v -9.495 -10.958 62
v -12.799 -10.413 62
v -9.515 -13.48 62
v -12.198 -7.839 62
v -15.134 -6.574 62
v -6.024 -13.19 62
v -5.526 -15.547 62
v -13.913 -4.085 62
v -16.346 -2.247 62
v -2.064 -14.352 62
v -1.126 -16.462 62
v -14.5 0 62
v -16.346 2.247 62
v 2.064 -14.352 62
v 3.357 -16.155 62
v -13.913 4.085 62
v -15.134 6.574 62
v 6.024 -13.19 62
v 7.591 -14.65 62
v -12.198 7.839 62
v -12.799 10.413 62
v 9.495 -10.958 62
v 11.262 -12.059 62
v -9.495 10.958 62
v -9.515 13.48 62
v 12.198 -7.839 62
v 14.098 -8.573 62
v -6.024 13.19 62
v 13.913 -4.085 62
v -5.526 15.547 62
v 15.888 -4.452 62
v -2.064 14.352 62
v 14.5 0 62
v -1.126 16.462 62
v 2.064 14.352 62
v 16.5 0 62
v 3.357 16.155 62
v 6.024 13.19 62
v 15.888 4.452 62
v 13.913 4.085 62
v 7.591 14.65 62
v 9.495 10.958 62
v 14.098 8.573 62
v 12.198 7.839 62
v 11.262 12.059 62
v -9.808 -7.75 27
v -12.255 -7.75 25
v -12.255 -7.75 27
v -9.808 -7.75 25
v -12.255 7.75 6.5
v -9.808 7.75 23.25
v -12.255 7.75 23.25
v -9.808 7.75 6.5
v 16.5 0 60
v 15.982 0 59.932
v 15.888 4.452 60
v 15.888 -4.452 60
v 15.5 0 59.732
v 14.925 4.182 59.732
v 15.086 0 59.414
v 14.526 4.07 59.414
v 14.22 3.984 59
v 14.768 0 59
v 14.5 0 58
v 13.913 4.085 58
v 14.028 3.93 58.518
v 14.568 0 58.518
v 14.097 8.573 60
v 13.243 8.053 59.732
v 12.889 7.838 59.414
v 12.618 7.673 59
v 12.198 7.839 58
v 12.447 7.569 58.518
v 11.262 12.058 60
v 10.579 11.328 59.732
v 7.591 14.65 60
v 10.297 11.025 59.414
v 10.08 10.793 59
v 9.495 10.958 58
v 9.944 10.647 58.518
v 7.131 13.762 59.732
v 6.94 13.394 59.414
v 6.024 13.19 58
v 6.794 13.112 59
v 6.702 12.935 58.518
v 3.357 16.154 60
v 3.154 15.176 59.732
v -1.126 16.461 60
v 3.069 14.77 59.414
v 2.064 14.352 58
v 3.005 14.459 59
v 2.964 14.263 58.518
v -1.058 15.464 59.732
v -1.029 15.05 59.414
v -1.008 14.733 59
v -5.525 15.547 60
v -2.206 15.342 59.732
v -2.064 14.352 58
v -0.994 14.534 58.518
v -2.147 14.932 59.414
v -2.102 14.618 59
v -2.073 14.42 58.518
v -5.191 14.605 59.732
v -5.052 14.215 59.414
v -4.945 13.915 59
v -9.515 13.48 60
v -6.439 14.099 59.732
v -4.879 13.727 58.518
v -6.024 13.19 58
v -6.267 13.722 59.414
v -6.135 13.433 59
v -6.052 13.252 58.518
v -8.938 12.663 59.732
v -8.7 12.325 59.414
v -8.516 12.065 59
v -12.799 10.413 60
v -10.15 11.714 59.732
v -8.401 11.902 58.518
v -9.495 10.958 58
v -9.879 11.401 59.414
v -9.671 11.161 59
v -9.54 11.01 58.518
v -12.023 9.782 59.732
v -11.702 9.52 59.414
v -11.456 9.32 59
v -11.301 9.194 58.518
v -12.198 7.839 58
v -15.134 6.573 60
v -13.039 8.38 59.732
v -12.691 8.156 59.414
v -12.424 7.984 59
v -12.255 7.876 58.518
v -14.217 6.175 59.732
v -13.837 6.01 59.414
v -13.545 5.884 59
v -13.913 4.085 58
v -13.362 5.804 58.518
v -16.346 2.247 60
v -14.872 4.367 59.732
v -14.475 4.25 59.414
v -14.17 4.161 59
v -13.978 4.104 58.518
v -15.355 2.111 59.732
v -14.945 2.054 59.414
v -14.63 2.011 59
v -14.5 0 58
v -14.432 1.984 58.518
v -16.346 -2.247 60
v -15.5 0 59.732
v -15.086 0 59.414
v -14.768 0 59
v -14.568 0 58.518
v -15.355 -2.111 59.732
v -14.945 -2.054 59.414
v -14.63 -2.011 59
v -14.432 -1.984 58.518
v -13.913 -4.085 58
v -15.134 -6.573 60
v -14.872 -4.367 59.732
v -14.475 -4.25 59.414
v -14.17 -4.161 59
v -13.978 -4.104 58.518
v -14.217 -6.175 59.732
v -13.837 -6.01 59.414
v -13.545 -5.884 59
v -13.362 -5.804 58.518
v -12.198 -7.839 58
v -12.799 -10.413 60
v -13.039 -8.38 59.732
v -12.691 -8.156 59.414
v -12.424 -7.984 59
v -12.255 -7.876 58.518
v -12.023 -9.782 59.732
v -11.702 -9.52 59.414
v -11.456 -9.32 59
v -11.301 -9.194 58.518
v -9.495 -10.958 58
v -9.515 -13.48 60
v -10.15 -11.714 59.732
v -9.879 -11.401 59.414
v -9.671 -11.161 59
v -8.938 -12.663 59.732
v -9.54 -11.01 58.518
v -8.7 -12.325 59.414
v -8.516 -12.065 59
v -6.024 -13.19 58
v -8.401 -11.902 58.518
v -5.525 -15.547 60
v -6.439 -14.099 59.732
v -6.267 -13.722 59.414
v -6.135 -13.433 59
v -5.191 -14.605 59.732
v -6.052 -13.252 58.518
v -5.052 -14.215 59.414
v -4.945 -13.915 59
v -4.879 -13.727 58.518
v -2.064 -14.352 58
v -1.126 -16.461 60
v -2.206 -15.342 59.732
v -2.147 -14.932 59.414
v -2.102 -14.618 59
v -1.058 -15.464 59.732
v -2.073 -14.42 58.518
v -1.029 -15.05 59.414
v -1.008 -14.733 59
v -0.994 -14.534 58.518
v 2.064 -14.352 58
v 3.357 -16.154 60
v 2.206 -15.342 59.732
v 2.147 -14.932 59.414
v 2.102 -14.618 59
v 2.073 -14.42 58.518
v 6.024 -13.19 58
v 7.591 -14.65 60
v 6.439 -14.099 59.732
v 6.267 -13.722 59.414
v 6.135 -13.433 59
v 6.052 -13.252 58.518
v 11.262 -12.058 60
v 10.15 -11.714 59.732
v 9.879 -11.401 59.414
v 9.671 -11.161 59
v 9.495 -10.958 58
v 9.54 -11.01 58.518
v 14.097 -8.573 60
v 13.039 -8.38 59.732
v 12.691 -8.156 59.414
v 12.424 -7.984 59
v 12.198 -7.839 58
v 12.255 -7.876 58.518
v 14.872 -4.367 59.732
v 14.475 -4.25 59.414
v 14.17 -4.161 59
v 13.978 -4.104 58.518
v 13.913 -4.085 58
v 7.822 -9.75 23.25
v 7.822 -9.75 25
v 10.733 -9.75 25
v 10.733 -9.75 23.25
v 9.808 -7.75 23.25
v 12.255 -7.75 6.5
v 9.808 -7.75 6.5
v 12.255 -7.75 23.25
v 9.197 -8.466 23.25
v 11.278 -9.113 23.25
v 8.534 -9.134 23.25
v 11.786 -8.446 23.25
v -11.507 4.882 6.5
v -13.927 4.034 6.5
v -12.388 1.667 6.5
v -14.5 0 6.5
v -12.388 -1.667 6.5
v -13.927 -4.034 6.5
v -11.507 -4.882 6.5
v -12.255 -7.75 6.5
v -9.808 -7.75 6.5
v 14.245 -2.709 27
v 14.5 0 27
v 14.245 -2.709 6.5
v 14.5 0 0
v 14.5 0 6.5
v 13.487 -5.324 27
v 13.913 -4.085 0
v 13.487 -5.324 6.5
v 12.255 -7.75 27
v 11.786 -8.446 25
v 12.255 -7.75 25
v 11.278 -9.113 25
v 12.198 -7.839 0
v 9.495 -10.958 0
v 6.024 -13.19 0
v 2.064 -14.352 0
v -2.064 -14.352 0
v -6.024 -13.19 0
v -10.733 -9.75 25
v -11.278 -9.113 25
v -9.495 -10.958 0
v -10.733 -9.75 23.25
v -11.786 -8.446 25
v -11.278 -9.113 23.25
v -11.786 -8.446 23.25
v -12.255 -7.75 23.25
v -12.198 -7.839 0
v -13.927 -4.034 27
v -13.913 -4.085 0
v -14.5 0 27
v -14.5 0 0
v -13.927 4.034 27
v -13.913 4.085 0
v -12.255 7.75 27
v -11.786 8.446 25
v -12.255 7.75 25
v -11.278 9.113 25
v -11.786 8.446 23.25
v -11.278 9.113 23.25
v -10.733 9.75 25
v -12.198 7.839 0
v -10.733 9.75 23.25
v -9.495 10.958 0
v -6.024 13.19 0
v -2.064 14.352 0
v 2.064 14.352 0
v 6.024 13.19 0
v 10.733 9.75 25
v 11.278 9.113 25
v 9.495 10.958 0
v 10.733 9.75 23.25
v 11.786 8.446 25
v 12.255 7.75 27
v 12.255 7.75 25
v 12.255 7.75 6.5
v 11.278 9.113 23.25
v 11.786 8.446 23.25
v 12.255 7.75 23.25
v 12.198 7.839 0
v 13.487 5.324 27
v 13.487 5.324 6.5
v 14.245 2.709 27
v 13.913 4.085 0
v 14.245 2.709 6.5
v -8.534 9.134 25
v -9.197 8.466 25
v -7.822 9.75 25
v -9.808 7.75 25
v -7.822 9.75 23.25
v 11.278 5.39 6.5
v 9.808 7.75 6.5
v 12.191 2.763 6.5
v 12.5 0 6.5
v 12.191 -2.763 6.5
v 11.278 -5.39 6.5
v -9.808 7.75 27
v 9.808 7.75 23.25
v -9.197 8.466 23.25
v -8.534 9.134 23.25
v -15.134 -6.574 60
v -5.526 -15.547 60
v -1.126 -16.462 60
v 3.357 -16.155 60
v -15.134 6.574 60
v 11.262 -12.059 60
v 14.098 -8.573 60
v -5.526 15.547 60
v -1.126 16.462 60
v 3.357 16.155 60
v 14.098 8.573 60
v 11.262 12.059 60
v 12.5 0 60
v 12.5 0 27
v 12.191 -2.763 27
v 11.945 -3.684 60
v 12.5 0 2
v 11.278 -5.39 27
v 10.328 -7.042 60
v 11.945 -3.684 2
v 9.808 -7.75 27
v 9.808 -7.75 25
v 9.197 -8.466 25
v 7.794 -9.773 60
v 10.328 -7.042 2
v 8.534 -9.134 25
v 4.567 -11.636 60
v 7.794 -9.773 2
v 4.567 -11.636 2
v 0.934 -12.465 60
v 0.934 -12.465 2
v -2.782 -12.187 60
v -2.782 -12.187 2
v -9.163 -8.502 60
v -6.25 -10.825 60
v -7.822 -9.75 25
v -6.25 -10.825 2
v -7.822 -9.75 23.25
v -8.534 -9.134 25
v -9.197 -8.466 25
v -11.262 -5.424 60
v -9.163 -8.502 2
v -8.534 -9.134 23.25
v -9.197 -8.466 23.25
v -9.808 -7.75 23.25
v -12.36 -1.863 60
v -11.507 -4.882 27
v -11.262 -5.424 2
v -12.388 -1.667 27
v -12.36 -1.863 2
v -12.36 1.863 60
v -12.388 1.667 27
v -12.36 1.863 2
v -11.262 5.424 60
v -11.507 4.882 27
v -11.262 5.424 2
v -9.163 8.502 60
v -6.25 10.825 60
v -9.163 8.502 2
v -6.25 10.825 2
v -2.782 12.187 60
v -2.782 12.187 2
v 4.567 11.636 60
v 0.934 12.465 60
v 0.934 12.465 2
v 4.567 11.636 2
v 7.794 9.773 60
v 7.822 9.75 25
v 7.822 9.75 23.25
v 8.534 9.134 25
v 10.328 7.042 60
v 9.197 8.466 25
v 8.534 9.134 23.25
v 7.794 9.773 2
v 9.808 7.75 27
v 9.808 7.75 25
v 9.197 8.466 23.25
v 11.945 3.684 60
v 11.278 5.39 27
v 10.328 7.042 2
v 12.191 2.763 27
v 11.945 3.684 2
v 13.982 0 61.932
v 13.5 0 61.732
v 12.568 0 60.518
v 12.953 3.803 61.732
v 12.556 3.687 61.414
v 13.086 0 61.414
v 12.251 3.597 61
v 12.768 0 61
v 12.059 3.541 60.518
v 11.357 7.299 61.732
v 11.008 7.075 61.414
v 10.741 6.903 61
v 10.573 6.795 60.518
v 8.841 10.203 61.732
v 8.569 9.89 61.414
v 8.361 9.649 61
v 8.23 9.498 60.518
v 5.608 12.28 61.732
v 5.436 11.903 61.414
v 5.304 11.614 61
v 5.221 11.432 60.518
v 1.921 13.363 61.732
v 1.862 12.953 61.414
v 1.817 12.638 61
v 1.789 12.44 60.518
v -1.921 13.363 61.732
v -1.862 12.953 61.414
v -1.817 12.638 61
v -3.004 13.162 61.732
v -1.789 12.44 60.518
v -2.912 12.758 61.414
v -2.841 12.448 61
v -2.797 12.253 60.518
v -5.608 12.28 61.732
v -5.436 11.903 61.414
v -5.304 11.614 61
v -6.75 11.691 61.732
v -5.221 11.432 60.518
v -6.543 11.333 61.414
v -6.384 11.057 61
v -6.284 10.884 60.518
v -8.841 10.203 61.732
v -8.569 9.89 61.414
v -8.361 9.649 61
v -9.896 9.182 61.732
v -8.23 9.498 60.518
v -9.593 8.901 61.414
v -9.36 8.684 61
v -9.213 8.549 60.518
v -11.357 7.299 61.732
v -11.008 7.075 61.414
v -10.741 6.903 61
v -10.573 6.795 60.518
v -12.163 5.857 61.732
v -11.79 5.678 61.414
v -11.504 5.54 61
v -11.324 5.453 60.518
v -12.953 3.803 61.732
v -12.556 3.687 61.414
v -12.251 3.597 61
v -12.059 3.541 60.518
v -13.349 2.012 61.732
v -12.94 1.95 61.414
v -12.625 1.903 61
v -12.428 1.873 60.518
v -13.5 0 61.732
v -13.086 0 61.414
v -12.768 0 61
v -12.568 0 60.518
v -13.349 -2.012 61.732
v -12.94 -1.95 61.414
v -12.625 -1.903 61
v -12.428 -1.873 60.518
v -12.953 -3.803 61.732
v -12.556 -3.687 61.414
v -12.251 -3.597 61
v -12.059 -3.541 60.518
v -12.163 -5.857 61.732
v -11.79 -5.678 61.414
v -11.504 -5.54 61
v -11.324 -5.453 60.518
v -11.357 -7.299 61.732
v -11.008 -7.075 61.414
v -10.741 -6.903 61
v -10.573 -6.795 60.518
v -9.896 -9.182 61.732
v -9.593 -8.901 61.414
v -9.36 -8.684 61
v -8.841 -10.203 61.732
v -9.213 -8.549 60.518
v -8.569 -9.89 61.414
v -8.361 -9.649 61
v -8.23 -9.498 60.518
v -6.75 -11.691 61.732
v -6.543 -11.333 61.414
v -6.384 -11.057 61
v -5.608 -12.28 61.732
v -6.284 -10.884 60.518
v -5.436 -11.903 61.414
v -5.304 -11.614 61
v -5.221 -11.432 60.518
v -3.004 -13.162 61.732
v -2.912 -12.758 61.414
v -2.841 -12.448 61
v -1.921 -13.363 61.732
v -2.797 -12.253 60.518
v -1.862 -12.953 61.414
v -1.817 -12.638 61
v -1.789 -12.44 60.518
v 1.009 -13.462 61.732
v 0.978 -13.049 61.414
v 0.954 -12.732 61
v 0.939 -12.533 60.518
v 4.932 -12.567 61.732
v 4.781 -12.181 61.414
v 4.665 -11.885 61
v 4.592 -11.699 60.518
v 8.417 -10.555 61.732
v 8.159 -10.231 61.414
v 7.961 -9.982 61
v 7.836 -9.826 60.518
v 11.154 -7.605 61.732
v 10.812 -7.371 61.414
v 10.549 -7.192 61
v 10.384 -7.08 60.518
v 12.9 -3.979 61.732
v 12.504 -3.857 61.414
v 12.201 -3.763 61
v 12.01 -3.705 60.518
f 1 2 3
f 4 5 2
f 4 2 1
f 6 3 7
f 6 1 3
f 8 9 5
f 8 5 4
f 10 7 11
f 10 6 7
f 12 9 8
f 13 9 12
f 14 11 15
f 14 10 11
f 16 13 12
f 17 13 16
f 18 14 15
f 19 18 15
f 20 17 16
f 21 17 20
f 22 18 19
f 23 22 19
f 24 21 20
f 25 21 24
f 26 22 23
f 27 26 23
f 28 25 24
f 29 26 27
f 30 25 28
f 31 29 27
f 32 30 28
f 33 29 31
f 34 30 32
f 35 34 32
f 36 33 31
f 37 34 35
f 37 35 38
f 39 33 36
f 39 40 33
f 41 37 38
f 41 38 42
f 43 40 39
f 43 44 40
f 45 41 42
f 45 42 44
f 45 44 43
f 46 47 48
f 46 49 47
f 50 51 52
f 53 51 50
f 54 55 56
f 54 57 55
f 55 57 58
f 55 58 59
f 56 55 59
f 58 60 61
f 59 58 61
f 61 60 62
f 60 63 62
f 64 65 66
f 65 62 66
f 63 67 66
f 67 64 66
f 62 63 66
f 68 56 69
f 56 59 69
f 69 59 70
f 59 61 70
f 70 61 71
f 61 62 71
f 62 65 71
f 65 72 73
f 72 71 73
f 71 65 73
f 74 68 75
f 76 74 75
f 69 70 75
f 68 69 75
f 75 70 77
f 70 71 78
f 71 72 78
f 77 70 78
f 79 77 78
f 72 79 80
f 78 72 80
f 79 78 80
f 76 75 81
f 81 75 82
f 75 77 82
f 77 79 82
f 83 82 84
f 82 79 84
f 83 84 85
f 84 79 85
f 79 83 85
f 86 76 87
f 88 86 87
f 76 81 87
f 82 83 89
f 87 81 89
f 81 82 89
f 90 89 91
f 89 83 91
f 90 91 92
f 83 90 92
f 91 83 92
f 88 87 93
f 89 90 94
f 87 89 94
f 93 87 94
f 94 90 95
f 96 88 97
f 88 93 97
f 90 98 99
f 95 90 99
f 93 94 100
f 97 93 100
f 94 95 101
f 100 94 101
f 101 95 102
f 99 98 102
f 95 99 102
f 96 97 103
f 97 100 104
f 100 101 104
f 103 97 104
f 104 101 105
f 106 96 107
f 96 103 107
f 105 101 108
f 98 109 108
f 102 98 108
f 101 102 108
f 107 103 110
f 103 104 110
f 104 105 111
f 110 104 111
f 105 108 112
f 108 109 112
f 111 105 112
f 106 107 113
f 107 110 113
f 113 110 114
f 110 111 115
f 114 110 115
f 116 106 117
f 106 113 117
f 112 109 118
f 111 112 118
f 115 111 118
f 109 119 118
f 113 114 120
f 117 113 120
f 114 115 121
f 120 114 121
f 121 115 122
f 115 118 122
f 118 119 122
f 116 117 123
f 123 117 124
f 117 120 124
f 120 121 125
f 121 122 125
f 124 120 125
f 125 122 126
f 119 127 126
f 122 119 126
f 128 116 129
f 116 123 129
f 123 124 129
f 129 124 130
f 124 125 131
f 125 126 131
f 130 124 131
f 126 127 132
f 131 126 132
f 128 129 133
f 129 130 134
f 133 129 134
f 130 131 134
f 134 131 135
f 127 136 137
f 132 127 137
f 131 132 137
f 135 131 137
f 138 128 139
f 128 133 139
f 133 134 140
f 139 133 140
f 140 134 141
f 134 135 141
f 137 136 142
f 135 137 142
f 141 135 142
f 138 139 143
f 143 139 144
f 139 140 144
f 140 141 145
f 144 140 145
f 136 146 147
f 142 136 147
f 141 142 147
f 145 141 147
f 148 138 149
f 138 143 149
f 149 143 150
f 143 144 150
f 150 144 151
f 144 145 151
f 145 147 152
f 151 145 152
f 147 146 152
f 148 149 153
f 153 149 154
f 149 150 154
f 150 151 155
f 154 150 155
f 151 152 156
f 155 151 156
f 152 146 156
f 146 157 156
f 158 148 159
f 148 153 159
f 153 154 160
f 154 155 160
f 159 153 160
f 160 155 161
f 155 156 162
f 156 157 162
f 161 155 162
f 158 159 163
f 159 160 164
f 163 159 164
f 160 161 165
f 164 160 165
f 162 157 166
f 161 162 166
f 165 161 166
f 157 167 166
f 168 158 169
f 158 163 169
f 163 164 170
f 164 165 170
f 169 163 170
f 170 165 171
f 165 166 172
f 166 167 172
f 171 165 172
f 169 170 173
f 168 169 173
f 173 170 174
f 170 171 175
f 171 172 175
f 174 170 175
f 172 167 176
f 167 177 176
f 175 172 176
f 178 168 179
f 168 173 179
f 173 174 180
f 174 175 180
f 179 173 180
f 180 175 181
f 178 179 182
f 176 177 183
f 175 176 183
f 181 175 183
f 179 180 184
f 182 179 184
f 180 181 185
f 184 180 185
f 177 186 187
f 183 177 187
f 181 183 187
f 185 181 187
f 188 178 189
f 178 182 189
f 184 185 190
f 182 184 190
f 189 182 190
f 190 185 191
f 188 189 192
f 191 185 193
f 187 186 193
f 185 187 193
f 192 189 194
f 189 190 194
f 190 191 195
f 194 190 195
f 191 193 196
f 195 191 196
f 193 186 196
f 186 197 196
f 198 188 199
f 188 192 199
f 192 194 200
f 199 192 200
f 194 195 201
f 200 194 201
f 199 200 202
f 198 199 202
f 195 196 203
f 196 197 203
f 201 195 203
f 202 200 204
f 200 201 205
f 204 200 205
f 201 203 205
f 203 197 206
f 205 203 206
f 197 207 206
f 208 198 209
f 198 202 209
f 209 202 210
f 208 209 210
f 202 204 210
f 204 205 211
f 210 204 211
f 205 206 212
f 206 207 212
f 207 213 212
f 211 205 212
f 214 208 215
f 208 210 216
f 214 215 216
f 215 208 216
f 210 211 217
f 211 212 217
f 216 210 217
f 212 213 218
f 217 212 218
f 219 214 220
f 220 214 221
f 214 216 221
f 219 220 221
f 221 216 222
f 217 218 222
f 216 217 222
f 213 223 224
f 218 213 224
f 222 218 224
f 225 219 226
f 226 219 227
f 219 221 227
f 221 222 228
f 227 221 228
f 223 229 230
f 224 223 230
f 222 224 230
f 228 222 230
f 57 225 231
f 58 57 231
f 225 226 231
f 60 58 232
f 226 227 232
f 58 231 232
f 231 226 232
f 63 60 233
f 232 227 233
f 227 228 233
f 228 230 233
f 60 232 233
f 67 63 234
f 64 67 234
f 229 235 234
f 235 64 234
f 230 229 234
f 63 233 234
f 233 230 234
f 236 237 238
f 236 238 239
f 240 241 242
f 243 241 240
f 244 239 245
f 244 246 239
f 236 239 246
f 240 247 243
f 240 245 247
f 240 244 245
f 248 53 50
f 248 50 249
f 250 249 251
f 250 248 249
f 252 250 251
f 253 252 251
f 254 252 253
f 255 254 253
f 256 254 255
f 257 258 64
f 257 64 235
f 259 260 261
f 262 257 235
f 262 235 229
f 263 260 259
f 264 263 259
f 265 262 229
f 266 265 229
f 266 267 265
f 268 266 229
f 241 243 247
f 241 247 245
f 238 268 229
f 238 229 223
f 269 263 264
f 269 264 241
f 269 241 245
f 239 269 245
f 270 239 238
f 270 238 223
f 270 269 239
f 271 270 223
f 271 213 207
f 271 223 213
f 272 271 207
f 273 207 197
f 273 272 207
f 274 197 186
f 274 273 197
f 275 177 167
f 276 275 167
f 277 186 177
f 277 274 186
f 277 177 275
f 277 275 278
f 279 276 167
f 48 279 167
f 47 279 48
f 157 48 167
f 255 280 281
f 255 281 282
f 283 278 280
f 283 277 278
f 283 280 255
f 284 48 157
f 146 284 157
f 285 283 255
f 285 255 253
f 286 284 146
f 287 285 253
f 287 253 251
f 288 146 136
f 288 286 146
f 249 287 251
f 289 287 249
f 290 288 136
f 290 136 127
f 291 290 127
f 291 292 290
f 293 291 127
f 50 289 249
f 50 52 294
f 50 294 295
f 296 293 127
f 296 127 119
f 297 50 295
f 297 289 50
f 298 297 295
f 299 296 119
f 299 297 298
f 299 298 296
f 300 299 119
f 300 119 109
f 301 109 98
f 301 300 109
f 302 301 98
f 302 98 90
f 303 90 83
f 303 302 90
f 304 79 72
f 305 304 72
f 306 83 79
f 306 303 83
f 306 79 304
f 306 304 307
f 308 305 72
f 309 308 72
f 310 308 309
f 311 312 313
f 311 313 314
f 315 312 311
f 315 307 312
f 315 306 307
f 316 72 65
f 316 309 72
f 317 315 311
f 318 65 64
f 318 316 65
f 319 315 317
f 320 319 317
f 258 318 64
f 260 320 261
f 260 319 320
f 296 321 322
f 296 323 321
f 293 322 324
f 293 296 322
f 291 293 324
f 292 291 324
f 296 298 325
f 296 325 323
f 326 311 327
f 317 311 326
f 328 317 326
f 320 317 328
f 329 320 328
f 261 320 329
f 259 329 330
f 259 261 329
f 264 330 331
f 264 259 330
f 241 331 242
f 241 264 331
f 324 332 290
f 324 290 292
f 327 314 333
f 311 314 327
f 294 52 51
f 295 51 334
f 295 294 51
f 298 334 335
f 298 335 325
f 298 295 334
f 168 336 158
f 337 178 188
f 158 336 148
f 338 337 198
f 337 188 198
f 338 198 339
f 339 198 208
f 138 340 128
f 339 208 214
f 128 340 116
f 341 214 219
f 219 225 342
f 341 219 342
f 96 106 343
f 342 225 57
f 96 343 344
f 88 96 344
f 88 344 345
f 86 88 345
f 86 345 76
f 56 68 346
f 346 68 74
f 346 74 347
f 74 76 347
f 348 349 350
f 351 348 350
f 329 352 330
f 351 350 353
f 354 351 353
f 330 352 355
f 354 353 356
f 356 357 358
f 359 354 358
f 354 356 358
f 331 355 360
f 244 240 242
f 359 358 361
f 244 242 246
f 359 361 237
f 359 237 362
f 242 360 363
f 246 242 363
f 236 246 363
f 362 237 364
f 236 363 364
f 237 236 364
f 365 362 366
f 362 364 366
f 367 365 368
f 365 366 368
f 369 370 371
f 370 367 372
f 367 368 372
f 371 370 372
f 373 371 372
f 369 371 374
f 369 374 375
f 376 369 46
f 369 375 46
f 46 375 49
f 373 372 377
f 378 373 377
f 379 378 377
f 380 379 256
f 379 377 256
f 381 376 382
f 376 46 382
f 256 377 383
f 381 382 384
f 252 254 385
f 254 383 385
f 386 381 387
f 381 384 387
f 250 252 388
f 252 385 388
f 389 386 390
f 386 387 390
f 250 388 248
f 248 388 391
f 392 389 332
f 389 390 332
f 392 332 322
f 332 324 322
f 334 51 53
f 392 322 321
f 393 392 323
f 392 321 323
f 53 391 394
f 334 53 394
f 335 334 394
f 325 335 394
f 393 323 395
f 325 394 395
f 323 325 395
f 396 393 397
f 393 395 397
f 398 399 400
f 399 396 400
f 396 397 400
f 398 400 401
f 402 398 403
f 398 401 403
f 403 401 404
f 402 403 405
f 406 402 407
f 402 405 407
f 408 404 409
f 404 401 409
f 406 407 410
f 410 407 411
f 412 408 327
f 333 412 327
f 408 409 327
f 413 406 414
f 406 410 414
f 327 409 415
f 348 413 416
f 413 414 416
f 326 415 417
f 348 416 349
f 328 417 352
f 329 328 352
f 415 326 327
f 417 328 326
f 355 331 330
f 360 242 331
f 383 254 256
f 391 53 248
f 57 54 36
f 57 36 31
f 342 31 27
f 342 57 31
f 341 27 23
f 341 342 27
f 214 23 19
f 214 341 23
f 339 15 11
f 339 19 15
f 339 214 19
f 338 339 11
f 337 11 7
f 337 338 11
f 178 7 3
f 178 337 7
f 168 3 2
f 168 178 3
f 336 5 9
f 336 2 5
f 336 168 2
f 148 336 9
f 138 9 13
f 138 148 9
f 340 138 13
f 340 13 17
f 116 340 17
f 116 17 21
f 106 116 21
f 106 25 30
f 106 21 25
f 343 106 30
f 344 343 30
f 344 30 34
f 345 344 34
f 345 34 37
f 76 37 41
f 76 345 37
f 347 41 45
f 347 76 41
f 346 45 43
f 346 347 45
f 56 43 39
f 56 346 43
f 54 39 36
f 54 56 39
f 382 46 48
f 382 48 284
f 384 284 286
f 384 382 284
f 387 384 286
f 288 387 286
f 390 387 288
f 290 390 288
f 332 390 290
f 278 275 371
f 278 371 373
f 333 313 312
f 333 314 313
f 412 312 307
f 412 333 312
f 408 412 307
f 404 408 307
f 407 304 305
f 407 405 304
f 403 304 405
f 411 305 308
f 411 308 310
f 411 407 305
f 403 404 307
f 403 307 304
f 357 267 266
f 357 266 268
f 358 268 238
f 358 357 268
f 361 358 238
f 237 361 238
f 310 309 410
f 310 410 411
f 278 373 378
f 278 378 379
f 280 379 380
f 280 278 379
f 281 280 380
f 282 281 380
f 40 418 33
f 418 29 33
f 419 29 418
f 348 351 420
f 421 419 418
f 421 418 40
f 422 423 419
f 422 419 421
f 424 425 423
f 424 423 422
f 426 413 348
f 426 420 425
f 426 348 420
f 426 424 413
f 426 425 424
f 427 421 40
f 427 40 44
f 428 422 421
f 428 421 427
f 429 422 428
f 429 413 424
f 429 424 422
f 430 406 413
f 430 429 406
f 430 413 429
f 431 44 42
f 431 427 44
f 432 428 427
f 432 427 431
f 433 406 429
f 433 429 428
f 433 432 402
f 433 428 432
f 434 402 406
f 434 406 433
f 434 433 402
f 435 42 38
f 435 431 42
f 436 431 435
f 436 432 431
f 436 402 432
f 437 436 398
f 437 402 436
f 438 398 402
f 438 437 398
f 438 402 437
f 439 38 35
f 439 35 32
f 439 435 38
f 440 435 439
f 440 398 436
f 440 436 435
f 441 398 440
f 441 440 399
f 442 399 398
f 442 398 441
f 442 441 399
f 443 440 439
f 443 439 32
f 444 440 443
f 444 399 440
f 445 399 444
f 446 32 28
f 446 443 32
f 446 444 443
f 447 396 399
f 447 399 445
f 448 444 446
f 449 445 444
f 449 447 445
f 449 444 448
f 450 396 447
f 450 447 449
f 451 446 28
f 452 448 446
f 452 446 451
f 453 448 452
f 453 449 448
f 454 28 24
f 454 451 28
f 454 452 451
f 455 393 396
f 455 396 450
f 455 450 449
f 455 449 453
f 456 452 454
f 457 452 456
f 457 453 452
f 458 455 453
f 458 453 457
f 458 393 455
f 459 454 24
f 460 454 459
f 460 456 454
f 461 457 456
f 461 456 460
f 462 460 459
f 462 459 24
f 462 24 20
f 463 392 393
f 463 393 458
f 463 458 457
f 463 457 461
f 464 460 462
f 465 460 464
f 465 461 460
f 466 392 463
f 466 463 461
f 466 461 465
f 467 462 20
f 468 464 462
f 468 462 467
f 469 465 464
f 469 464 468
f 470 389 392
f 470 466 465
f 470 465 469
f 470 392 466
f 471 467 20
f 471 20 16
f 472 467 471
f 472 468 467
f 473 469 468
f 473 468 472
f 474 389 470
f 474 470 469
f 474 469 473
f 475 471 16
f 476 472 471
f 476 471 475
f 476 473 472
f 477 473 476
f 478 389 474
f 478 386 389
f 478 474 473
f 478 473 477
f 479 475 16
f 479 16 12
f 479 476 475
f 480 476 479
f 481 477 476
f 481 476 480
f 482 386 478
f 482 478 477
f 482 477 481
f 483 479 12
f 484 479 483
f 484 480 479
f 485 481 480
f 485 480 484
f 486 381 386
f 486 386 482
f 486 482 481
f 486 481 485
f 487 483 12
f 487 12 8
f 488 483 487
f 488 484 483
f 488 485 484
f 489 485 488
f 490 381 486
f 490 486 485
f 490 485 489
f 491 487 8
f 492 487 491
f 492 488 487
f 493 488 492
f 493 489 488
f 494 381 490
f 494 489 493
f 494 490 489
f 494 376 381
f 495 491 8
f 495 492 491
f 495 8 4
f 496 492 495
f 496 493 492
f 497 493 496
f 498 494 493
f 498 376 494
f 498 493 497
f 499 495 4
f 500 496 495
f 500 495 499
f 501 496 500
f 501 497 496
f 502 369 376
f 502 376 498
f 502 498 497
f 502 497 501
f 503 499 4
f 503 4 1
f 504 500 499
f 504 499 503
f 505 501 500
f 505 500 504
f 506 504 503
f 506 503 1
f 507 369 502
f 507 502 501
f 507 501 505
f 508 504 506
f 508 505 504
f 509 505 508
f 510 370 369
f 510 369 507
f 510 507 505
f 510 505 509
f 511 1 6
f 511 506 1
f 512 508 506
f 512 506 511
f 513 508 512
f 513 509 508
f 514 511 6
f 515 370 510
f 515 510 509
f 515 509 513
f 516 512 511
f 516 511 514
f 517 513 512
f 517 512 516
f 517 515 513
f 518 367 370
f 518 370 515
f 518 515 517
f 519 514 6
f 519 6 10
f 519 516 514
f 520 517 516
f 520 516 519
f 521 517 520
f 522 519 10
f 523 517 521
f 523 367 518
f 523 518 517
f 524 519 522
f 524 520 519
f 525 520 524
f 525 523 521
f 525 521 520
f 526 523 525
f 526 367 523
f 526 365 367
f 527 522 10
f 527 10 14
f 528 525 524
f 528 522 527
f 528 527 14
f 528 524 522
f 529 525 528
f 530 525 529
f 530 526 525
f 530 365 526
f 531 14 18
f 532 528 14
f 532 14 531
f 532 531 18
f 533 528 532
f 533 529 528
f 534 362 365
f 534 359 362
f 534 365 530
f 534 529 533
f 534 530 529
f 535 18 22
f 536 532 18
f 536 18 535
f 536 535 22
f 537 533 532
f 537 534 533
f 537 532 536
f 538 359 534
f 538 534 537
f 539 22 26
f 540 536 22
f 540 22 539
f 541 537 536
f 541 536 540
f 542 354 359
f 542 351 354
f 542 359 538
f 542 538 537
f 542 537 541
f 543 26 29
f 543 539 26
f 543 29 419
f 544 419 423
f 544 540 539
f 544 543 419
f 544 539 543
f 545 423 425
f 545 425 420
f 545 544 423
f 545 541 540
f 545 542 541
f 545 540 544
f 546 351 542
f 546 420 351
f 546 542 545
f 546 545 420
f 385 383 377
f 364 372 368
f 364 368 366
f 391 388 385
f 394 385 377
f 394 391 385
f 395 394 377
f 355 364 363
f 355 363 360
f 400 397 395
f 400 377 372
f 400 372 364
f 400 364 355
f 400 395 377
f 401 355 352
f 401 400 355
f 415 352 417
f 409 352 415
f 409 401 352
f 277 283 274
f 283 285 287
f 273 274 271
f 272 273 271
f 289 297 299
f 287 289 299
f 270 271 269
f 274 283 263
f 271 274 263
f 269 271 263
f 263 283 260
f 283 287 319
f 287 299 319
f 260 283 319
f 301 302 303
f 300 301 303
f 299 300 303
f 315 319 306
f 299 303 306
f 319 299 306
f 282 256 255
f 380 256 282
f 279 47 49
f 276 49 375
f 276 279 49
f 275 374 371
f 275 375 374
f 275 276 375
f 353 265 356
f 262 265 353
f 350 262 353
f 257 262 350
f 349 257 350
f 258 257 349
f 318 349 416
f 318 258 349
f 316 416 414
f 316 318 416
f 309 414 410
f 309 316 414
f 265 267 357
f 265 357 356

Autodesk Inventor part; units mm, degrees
ref_plane "XZ Plane" through (0, 0, 0) normal (0, 1, 0) x (-1, 0, 0)
ref_plane "XY Plane" through (0, 0, 0) normal (0, 0, 1) x (1, 0, 0)
sketch "Esboço1" plane through (0, 0, 0) normal (0, 0, 1) x (1, 0, 0)
  circle A0 centre (0, 0) radius 14.5
  dimension "d0" = 29
extrude "Extrusão1" add sketch "Esboço1" along normal blind 2
sketch "Esboço2" plane through (0, 0, 2) normal (0, 0, 1) x (1, 0, 0)
  circle A0 centre (0, 0) radius 14.5 projected
  circle A1 centre (0, 0) radius 12.5
  dimension "d3" = 2
extrude "Extrusão2" add sketch "Esboço2" along normal blind 58
ref_plane "Plano de trabalho4" through (29, 0, 0) normal (1, 0, 0) x (0, 1, 0)
sketch "Esboço5" plane through (29, 0, 0) normal (1, 0, 0) x (0, 1, 0)
  line L0 (-7.75, 27) -> (7.75, 27)
  line L1 (7.75, 27) -> (7.75, 6.5)
  line L2 (7.75, 6.5) -> (-7.75, 6.5)
  line L3 (-7.75, 6.5) -> (-7.75, 27)
  line L4 (-7.75, 27) -> (7.75, 6.5) construction
  line L5 (7.75, 27) -> (-7.75, 6.5) construction
  line L6 (14.5, 0) -> (-14.5, 0) projected
  point P0 (0, 0)
  point P1 (0, 16.75)
  dimension "d15" = 20.5
  dimension "d16" = 15.5
  dimension "d17" = 0
  dimension "d18" = 6.5
extrude "Extrusão4" cut sketch "Esboço5" against normal through all
sketch "Esboço7" plane through (0, 0, 60) normal (0, 0, 1) x (1, 0, 0)
  circle A0 centre (0, 0) radius 16.5
  circle A1 centre (0, 0) radius 12.5 projected
  dimension "d28" = 33
extrude "Extrusão6" add sketch "Esboço7" along normal blind 2
fillet "Arredondamento2" radius 2 1 edges at (-12.5, 0, 62)
fillet "Arredondamento3" radius 2 1 edges at (-14.5, 0, 60)
sketch "Sketch8" plane through (0, 0, 0) normal (1, 0, 0) x (0, 1, 0)
  line L0 (-9.75, 23.25) -> (9.75, 23.25)
  line L1 (9.75, 23.25) -> (9.75, 25)
  line L2 (9.75, 25) -> (-9.75, 25)
  line L3 (-9.75, 25) -> (-9.75, 23.25)
  line L4 (-7.75, 27) -> (7.75, 27) projected
  line L5 (7.75, 27) -> (7.75, 6.5) projected
  line L6 (-7.75, 6.5) -> (-7.75, 27) projected
  point P0 (0, 0)
  dimension "d37" = 2
  dimension "d38" = 1.75
  dimension "d39" = 2
  dimension "d40" = 2
extrude "Extrusion7" cut sketch "Sketch8" along normal mid plane 50 contours L3 L2 L6 L0 | L6 L2 L5 L0 | L5 L2 L1 L0
